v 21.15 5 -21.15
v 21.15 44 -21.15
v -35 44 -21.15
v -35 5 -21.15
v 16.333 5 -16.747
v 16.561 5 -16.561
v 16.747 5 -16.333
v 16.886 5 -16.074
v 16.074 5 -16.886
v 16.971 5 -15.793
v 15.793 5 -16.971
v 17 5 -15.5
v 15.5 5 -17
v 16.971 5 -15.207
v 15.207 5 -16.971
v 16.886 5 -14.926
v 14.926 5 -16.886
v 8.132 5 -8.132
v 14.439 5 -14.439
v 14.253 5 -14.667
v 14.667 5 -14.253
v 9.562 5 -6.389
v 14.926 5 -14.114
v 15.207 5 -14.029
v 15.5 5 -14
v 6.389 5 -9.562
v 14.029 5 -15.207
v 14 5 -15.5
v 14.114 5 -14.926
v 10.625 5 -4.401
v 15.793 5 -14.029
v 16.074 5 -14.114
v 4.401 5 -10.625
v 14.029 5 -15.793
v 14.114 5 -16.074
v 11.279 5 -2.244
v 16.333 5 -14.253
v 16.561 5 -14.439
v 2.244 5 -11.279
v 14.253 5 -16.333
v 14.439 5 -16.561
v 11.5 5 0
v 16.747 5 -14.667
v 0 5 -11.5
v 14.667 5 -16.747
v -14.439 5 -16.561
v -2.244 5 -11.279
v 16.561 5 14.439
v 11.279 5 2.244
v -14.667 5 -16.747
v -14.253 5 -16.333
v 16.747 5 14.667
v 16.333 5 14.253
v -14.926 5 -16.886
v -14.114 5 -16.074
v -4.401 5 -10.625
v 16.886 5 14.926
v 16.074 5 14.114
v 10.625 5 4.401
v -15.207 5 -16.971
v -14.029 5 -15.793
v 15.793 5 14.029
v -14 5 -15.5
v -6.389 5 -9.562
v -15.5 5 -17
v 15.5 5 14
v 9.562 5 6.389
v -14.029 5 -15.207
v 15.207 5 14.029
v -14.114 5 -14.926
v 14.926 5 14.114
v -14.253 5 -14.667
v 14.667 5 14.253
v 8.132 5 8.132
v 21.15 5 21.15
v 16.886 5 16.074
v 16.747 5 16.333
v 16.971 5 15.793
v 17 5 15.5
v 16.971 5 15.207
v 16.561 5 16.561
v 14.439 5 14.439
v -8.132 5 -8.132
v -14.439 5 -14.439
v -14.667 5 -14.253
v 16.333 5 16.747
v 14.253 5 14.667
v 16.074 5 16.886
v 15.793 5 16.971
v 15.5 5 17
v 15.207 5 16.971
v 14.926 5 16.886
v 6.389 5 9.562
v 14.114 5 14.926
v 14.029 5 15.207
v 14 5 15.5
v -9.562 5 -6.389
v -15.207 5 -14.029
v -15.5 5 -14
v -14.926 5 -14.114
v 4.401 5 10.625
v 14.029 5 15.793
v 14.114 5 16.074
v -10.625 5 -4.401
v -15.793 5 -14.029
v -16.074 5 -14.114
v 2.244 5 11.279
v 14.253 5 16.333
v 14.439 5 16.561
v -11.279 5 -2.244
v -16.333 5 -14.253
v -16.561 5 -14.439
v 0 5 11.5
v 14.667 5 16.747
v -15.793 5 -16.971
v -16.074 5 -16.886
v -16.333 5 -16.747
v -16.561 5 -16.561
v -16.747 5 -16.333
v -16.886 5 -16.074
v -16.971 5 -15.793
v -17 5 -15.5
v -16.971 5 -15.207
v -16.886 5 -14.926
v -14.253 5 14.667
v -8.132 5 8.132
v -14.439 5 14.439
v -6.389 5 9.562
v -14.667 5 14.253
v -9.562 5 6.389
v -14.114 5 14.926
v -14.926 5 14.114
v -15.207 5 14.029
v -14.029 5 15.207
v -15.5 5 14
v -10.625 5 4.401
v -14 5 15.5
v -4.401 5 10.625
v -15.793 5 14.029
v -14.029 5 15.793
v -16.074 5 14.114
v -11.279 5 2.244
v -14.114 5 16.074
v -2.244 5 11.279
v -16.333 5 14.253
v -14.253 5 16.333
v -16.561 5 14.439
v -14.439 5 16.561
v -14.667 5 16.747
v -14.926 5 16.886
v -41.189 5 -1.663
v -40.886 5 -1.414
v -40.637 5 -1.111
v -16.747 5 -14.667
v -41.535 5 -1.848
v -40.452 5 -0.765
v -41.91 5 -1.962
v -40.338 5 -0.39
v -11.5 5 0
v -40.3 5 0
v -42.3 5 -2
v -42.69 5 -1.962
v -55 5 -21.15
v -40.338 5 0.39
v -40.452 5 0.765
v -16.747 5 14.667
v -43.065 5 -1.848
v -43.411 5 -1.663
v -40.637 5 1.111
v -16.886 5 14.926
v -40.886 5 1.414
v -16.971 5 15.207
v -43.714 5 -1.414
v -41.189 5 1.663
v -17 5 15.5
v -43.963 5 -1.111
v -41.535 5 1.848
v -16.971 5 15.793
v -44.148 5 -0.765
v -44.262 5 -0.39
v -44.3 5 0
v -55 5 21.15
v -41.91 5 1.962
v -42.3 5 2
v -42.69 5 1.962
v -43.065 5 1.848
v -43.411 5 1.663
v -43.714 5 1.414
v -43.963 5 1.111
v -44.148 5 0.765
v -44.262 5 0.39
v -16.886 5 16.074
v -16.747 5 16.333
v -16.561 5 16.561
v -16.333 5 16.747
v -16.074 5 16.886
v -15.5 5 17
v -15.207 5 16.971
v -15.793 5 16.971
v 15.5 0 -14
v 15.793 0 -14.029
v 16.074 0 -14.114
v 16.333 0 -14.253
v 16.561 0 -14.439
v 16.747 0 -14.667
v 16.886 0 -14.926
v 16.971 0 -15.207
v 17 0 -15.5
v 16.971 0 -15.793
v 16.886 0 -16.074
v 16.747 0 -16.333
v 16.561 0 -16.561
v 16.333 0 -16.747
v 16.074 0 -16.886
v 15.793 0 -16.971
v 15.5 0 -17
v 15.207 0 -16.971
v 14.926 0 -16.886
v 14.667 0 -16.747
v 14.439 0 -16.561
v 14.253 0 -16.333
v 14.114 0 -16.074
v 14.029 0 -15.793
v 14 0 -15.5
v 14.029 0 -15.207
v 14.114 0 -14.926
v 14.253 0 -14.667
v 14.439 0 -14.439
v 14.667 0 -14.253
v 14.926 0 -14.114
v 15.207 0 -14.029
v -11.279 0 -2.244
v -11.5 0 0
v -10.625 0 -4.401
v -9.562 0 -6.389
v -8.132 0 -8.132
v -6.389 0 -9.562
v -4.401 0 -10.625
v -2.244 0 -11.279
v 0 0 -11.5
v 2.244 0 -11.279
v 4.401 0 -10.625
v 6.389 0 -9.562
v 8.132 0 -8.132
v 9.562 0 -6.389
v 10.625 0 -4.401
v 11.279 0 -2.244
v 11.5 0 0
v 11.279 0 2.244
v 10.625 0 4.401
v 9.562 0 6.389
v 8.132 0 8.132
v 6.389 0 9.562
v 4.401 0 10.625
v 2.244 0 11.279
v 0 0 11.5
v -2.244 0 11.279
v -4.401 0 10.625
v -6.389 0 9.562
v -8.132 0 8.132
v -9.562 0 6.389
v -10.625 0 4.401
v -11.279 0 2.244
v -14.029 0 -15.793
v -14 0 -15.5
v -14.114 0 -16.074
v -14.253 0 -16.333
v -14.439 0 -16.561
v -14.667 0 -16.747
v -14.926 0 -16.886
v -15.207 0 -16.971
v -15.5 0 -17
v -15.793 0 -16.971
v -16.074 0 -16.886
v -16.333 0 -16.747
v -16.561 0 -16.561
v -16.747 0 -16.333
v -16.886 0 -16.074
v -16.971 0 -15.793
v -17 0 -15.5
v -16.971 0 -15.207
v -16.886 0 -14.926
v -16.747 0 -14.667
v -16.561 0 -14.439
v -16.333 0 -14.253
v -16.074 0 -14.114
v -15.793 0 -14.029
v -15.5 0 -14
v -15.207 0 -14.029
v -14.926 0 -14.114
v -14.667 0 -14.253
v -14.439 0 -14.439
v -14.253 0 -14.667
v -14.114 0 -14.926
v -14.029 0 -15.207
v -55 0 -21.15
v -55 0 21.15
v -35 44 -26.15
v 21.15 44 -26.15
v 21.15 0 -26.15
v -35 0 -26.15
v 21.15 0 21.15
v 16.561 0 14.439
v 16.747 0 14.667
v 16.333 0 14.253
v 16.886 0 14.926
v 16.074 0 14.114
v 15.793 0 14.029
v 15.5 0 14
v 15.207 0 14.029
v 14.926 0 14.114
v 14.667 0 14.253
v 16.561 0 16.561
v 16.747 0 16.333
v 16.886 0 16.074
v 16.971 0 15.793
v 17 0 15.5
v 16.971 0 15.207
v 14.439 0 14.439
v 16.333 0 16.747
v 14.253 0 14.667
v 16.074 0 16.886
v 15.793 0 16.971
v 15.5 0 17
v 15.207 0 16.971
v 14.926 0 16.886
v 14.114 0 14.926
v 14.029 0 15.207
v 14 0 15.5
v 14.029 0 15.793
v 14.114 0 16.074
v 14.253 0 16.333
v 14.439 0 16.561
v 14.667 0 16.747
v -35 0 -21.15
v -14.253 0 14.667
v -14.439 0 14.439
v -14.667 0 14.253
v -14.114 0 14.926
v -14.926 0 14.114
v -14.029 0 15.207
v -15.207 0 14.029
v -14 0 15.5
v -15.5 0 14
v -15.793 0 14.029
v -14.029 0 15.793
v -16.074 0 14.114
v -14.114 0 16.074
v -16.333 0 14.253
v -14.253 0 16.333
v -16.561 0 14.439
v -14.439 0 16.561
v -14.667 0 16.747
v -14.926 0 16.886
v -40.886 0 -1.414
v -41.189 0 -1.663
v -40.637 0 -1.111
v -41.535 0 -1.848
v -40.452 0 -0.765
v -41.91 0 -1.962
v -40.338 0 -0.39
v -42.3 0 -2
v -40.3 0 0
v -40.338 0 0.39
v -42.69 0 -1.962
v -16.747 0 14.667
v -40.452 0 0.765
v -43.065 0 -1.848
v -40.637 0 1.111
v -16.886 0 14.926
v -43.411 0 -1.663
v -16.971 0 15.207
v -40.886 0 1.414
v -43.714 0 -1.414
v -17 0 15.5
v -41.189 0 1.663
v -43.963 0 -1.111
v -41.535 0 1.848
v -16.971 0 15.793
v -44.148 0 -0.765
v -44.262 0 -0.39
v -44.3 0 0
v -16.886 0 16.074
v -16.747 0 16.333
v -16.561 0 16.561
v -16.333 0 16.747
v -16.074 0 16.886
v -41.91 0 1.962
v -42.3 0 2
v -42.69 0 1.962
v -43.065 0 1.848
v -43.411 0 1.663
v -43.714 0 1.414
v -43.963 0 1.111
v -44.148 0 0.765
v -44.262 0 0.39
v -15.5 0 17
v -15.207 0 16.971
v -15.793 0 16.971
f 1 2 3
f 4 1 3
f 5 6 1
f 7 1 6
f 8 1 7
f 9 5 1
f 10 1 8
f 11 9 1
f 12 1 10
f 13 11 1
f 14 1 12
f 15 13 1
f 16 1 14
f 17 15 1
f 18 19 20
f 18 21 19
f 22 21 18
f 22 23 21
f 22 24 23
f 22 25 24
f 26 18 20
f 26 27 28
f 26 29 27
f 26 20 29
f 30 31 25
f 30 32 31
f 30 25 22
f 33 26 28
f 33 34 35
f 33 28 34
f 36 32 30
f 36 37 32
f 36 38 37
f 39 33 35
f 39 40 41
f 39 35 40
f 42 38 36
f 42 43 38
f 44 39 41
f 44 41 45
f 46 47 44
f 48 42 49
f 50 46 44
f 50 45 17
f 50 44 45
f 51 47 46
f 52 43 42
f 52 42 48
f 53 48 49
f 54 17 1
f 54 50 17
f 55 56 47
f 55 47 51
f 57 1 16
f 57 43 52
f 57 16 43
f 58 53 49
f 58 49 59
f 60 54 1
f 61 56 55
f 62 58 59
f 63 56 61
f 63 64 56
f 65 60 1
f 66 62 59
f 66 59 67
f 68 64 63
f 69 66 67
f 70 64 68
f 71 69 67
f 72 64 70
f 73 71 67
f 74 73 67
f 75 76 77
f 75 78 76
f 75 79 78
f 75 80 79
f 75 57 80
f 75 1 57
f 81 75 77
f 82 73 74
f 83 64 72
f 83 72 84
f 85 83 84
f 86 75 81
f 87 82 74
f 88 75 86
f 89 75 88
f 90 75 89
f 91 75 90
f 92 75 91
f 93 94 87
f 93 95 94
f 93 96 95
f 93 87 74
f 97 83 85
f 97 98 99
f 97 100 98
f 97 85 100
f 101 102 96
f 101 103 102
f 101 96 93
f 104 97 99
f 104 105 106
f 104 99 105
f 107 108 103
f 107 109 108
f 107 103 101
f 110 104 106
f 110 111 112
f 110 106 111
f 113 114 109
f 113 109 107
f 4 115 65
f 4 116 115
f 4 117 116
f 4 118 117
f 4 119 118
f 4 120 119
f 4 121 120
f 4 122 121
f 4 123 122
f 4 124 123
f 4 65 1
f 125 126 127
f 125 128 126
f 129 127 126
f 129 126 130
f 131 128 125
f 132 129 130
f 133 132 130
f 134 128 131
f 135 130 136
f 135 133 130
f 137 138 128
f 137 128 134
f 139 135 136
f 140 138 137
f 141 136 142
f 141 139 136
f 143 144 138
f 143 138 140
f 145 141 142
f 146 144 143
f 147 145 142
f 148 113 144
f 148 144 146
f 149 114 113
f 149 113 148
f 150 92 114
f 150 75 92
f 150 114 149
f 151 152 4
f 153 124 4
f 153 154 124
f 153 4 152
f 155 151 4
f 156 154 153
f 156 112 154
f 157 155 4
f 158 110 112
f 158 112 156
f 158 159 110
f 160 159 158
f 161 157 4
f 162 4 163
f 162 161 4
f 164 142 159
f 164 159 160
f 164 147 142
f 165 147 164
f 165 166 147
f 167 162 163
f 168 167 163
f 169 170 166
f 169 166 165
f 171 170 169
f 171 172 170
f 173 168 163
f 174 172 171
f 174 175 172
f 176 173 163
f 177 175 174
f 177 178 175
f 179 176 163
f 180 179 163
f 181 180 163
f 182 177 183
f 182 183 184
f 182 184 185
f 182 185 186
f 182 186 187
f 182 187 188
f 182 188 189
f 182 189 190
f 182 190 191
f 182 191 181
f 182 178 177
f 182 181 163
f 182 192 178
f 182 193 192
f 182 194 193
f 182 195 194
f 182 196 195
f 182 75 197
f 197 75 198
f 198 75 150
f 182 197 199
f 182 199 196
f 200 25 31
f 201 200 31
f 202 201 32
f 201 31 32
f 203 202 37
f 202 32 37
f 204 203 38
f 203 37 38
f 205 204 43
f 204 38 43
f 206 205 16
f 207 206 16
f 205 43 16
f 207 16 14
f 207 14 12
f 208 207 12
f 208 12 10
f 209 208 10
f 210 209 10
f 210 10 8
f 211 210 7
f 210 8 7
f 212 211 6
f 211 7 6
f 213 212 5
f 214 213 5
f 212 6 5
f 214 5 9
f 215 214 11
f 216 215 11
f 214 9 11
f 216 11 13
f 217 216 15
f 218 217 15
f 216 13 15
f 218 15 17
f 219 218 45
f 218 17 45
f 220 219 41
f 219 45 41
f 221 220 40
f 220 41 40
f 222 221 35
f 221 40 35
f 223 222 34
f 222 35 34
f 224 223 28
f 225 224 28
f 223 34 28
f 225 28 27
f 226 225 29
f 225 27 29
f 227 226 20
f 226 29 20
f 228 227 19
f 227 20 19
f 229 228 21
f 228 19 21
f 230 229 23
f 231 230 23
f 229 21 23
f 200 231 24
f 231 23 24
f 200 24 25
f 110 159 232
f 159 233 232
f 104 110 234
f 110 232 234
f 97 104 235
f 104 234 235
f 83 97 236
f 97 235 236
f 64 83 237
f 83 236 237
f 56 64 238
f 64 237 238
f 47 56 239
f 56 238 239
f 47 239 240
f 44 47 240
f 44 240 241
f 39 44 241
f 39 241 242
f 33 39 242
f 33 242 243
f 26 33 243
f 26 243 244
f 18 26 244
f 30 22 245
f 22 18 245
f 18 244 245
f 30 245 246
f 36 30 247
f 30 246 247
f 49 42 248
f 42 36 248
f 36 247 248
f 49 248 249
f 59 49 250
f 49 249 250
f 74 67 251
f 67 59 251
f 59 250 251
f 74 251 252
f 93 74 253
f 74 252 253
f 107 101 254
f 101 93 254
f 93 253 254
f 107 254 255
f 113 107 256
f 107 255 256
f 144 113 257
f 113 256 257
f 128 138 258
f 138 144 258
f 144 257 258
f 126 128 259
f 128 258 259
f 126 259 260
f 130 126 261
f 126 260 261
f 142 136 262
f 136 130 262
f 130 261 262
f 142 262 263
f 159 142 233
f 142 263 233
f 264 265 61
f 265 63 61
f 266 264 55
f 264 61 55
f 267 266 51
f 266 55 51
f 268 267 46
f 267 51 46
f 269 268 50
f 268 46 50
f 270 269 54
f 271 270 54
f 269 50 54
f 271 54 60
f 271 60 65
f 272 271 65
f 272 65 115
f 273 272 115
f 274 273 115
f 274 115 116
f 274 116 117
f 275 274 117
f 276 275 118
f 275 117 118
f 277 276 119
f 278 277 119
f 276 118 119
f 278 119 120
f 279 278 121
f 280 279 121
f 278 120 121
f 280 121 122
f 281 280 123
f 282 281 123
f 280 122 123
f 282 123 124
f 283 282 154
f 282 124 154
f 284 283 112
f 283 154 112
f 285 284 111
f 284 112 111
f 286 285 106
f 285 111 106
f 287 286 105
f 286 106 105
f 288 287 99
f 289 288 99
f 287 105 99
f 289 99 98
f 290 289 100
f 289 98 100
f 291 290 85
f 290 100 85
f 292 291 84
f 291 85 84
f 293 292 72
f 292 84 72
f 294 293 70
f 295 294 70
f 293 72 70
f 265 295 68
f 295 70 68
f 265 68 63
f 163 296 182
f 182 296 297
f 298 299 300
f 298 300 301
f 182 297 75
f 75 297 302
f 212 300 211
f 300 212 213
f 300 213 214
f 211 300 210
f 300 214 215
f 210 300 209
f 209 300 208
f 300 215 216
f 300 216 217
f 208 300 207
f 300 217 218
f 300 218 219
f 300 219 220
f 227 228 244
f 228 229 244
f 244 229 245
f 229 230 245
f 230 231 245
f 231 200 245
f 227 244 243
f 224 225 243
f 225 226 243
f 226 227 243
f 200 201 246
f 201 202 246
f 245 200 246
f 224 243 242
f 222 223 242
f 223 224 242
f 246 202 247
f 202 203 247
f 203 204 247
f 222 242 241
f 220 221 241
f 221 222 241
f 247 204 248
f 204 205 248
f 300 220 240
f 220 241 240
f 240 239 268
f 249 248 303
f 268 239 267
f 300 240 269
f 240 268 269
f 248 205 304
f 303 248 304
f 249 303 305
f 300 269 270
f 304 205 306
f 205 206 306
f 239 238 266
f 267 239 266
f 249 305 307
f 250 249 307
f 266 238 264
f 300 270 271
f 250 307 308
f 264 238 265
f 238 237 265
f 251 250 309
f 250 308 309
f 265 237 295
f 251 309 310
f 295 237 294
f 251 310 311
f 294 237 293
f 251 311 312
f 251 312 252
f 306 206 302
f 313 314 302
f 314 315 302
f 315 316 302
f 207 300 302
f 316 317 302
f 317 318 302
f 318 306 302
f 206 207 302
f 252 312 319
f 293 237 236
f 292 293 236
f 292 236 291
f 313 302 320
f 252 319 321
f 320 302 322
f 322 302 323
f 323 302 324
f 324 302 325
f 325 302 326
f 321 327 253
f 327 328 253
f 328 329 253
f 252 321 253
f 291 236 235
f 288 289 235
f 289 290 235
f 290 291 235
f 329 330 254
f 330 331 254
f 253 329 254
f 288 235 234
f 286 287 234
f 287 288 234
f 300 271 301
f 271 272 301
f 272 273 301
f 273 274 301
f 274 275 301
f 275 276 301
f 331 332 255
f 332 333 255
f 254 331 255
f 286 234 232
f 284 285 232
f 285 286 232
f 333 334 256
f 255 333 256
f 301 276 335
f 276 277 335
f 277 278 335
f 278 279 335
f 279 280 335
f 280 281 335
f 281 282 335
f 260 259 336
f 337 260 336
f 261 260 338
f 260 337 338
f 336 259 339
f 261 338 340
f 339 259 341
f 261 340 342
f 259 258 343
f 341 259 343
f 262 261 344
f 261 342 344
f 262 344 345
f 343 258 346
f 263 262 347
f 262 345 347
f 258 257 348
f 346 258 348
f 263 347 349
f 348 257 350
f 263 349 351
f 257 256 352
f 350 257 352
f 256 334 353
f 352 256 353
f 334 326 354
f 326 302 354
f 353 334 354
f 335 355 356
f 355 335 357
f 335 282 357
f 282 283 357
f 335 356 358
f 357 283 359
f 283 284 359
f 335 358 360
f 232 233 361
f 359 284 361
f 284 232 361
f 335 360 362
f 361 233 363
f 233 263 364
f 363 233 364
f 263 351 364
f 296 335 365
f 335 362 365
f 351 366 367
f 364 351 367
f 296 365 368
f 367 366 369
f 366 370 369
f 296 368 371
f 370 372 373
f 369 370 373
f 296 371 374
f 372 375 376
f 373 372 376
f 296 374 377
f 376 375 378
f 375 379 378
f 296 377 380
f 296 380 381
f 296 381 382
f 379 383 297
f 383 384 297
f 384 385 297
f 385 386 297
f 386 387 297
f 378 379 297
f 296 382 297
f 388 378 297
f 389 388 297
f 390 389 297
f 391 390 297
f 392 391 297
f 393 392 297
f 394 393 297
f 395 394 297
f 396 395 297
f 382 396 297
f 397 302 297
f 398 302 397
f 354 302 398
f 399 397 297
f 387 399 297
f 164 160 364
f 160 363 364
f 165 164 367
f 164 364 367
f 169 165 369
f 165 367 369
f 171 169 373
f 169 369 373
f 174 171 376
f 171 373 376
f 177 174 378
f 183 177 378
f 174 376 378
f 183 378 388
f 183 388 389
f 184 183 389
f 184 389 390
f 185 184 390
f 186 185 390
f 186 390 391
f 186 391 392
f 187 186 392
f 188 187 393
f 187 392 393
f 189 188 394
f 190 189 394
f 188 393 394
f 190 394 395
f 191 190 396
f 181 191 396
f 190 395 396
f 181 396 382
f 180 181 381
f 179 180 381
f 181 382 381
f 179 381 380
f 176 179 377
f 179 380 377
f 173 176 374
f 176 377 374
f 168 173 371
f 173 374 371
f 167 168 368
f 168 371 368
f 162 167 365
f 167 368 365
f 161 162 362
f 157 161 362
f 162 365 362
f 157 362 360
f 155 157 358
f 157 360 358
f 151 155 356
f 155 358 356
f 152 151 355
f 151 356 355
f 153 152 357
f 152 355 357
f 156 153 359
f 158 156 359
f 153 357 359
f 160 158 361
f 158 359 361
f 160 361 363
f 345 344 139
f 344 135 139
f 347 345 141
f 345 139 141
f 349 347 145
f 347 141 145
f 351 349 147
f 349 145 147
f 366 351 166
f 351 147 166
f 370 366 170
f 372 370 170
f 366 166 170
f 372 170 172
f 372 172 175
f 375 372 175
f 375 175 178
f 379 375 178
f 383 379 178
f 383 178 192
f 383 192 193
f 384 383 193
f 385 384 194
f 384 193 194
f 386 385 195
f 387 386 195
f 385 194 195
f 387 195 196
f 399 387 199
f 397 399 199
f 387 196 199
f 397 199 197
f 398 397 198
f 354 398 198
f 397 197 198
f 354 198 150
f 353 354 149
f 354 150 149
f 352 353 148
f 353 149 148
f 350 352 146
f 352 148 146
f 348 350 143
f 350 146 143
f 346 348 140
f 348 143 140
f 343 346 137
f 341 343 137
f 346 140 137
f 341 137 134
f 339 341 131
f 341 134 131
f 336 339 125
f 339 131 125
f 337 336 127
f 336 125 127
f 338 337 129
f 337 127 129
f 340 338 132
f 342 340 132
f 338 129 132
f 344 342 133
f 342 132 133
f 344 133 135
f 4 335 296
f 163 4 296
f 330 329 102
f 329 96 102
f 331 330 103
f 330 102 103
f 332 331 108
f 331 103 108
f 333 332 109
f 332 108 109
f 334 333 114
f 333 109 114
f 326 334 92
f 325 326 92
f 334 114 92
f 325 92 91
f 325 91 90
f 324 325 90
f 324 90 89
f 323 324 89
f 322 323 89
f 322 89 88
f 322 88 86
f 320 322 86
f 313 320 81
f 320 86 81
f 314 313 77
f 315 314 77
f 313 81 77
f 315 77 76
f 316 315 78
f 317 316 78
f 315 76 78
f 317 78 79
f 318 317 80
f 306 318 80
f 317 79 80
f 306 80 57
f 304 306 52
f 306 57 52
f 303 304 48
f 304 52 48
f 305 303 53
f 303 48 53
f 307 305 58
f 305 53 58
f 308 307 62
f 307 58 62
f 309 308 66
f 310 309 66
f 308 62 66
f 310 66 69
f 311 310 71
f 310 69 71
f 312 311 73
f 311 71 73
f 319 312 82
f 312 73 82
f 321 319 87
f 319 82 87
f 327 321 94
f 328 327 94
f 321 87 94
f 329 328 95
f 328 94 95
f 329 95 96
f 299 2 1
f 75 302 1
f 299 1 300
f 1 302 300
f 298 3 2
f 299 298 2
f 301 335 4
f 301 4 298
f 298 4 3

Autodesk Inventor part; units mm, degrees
ref_plane "YZ Plane" through (0, 0, 0) normal (1, 0, 0) x (0, 1, 0)
ref_plane "XZ Plane" through (0, 0, 0) normal (0, 1, 0) x (-1, 0, 0)
sketch "Boceto1" plane through (0, 0, 0) normal (0, 1, 0) x (-1, 0, 0)
  line L0 (21.15, 21.15) -> (-21.15, 21.15)
  line L1 (-21.15, 21.15) -> (-21.15, -21.15)
  line L2 (-21.15, -21.15) -> (21.15, -21.15)
  line L3 (21.15, -21.15) -> (21.15, 21.15)
  line L4 (0, 0) -> (3.2885, 0)
  line L5 (0, 0) -> (0, -4.7563)
  circle A0 centre (0, 0) radius 11.5
  line L6 (21.15, -21.15) -> (55, -21.15)
  line L7 (55, -21.15) -> (55, 21.15)
  line L8 (55, 21.15) -> (21.15, 21.15)
  line L9 (21.15, 21.15) -> (21.15, -21.15)
  dimension "d0" = 42.3
  dimension "d1" = 42.3
  dimension "d26" = 23
  dimension "d35" = 55
extrude "Extrusión1" add sketch "Boceto1" along normal blind 5
sketch "Boceto2" plane through (0, 5, 0) normal (0, 1, 0) x (1, 0, 0)
  circle A0 centre (-15.5, 15.5) radius 1.5
  point P0 (0, 0)
  dimension "d4" = 3
  dimension "d5" = 15.5
  dimension "d6" = 15.5
extrude "Extrusión2" cut sketch "Boceto2" against normal through all
pattern_circular "Patrón circular1" count 4 over 360 about axis through (0, -10, 0) along (0, 1, 0) of "Extrusión2"
sketch "Boceto7" plane through (0, 0, 0) normal (0, -1, 0) x (1, 0, 0)
  circle A0 centre (-42.3, 0) radius 2
  point P0 (0, 0)
  dimension "d31" = 4
  dimension "d32" = 42.3
extrude "Extrusión7" cut sketch "Boceto7" against normal through all
sketch "Boceto8" plane through (21.15, 0, -21.15) normal (0, 0, -1) x (-1, 0, 0)
  line L0 (0, 0) -> (0, 5) projected
  line L1 (0, 0) -> (56.15, 0)
  line L2 (56.15, 0) -> (56.15, 44)
  line L3 (56.15, 44) -> (0, 44)
  line L4 (0, 44) -> (0, 0)
  line L5 (0, 5) -> (76.15, 5) projected
  point P0 (21.15, 0)
  dimension "d36" = 39
extrude "Extrusión8" add sketch "Boceto8" along normal blind 5
ref_plane "Plano de trabajo1" through (0, -17, 0) normal (0, -1, 0) x (1, 0, 0)
equation "\"d0\" = d1"
equation "\"d6\" = d5"
properties part number "Base Motor X1"
